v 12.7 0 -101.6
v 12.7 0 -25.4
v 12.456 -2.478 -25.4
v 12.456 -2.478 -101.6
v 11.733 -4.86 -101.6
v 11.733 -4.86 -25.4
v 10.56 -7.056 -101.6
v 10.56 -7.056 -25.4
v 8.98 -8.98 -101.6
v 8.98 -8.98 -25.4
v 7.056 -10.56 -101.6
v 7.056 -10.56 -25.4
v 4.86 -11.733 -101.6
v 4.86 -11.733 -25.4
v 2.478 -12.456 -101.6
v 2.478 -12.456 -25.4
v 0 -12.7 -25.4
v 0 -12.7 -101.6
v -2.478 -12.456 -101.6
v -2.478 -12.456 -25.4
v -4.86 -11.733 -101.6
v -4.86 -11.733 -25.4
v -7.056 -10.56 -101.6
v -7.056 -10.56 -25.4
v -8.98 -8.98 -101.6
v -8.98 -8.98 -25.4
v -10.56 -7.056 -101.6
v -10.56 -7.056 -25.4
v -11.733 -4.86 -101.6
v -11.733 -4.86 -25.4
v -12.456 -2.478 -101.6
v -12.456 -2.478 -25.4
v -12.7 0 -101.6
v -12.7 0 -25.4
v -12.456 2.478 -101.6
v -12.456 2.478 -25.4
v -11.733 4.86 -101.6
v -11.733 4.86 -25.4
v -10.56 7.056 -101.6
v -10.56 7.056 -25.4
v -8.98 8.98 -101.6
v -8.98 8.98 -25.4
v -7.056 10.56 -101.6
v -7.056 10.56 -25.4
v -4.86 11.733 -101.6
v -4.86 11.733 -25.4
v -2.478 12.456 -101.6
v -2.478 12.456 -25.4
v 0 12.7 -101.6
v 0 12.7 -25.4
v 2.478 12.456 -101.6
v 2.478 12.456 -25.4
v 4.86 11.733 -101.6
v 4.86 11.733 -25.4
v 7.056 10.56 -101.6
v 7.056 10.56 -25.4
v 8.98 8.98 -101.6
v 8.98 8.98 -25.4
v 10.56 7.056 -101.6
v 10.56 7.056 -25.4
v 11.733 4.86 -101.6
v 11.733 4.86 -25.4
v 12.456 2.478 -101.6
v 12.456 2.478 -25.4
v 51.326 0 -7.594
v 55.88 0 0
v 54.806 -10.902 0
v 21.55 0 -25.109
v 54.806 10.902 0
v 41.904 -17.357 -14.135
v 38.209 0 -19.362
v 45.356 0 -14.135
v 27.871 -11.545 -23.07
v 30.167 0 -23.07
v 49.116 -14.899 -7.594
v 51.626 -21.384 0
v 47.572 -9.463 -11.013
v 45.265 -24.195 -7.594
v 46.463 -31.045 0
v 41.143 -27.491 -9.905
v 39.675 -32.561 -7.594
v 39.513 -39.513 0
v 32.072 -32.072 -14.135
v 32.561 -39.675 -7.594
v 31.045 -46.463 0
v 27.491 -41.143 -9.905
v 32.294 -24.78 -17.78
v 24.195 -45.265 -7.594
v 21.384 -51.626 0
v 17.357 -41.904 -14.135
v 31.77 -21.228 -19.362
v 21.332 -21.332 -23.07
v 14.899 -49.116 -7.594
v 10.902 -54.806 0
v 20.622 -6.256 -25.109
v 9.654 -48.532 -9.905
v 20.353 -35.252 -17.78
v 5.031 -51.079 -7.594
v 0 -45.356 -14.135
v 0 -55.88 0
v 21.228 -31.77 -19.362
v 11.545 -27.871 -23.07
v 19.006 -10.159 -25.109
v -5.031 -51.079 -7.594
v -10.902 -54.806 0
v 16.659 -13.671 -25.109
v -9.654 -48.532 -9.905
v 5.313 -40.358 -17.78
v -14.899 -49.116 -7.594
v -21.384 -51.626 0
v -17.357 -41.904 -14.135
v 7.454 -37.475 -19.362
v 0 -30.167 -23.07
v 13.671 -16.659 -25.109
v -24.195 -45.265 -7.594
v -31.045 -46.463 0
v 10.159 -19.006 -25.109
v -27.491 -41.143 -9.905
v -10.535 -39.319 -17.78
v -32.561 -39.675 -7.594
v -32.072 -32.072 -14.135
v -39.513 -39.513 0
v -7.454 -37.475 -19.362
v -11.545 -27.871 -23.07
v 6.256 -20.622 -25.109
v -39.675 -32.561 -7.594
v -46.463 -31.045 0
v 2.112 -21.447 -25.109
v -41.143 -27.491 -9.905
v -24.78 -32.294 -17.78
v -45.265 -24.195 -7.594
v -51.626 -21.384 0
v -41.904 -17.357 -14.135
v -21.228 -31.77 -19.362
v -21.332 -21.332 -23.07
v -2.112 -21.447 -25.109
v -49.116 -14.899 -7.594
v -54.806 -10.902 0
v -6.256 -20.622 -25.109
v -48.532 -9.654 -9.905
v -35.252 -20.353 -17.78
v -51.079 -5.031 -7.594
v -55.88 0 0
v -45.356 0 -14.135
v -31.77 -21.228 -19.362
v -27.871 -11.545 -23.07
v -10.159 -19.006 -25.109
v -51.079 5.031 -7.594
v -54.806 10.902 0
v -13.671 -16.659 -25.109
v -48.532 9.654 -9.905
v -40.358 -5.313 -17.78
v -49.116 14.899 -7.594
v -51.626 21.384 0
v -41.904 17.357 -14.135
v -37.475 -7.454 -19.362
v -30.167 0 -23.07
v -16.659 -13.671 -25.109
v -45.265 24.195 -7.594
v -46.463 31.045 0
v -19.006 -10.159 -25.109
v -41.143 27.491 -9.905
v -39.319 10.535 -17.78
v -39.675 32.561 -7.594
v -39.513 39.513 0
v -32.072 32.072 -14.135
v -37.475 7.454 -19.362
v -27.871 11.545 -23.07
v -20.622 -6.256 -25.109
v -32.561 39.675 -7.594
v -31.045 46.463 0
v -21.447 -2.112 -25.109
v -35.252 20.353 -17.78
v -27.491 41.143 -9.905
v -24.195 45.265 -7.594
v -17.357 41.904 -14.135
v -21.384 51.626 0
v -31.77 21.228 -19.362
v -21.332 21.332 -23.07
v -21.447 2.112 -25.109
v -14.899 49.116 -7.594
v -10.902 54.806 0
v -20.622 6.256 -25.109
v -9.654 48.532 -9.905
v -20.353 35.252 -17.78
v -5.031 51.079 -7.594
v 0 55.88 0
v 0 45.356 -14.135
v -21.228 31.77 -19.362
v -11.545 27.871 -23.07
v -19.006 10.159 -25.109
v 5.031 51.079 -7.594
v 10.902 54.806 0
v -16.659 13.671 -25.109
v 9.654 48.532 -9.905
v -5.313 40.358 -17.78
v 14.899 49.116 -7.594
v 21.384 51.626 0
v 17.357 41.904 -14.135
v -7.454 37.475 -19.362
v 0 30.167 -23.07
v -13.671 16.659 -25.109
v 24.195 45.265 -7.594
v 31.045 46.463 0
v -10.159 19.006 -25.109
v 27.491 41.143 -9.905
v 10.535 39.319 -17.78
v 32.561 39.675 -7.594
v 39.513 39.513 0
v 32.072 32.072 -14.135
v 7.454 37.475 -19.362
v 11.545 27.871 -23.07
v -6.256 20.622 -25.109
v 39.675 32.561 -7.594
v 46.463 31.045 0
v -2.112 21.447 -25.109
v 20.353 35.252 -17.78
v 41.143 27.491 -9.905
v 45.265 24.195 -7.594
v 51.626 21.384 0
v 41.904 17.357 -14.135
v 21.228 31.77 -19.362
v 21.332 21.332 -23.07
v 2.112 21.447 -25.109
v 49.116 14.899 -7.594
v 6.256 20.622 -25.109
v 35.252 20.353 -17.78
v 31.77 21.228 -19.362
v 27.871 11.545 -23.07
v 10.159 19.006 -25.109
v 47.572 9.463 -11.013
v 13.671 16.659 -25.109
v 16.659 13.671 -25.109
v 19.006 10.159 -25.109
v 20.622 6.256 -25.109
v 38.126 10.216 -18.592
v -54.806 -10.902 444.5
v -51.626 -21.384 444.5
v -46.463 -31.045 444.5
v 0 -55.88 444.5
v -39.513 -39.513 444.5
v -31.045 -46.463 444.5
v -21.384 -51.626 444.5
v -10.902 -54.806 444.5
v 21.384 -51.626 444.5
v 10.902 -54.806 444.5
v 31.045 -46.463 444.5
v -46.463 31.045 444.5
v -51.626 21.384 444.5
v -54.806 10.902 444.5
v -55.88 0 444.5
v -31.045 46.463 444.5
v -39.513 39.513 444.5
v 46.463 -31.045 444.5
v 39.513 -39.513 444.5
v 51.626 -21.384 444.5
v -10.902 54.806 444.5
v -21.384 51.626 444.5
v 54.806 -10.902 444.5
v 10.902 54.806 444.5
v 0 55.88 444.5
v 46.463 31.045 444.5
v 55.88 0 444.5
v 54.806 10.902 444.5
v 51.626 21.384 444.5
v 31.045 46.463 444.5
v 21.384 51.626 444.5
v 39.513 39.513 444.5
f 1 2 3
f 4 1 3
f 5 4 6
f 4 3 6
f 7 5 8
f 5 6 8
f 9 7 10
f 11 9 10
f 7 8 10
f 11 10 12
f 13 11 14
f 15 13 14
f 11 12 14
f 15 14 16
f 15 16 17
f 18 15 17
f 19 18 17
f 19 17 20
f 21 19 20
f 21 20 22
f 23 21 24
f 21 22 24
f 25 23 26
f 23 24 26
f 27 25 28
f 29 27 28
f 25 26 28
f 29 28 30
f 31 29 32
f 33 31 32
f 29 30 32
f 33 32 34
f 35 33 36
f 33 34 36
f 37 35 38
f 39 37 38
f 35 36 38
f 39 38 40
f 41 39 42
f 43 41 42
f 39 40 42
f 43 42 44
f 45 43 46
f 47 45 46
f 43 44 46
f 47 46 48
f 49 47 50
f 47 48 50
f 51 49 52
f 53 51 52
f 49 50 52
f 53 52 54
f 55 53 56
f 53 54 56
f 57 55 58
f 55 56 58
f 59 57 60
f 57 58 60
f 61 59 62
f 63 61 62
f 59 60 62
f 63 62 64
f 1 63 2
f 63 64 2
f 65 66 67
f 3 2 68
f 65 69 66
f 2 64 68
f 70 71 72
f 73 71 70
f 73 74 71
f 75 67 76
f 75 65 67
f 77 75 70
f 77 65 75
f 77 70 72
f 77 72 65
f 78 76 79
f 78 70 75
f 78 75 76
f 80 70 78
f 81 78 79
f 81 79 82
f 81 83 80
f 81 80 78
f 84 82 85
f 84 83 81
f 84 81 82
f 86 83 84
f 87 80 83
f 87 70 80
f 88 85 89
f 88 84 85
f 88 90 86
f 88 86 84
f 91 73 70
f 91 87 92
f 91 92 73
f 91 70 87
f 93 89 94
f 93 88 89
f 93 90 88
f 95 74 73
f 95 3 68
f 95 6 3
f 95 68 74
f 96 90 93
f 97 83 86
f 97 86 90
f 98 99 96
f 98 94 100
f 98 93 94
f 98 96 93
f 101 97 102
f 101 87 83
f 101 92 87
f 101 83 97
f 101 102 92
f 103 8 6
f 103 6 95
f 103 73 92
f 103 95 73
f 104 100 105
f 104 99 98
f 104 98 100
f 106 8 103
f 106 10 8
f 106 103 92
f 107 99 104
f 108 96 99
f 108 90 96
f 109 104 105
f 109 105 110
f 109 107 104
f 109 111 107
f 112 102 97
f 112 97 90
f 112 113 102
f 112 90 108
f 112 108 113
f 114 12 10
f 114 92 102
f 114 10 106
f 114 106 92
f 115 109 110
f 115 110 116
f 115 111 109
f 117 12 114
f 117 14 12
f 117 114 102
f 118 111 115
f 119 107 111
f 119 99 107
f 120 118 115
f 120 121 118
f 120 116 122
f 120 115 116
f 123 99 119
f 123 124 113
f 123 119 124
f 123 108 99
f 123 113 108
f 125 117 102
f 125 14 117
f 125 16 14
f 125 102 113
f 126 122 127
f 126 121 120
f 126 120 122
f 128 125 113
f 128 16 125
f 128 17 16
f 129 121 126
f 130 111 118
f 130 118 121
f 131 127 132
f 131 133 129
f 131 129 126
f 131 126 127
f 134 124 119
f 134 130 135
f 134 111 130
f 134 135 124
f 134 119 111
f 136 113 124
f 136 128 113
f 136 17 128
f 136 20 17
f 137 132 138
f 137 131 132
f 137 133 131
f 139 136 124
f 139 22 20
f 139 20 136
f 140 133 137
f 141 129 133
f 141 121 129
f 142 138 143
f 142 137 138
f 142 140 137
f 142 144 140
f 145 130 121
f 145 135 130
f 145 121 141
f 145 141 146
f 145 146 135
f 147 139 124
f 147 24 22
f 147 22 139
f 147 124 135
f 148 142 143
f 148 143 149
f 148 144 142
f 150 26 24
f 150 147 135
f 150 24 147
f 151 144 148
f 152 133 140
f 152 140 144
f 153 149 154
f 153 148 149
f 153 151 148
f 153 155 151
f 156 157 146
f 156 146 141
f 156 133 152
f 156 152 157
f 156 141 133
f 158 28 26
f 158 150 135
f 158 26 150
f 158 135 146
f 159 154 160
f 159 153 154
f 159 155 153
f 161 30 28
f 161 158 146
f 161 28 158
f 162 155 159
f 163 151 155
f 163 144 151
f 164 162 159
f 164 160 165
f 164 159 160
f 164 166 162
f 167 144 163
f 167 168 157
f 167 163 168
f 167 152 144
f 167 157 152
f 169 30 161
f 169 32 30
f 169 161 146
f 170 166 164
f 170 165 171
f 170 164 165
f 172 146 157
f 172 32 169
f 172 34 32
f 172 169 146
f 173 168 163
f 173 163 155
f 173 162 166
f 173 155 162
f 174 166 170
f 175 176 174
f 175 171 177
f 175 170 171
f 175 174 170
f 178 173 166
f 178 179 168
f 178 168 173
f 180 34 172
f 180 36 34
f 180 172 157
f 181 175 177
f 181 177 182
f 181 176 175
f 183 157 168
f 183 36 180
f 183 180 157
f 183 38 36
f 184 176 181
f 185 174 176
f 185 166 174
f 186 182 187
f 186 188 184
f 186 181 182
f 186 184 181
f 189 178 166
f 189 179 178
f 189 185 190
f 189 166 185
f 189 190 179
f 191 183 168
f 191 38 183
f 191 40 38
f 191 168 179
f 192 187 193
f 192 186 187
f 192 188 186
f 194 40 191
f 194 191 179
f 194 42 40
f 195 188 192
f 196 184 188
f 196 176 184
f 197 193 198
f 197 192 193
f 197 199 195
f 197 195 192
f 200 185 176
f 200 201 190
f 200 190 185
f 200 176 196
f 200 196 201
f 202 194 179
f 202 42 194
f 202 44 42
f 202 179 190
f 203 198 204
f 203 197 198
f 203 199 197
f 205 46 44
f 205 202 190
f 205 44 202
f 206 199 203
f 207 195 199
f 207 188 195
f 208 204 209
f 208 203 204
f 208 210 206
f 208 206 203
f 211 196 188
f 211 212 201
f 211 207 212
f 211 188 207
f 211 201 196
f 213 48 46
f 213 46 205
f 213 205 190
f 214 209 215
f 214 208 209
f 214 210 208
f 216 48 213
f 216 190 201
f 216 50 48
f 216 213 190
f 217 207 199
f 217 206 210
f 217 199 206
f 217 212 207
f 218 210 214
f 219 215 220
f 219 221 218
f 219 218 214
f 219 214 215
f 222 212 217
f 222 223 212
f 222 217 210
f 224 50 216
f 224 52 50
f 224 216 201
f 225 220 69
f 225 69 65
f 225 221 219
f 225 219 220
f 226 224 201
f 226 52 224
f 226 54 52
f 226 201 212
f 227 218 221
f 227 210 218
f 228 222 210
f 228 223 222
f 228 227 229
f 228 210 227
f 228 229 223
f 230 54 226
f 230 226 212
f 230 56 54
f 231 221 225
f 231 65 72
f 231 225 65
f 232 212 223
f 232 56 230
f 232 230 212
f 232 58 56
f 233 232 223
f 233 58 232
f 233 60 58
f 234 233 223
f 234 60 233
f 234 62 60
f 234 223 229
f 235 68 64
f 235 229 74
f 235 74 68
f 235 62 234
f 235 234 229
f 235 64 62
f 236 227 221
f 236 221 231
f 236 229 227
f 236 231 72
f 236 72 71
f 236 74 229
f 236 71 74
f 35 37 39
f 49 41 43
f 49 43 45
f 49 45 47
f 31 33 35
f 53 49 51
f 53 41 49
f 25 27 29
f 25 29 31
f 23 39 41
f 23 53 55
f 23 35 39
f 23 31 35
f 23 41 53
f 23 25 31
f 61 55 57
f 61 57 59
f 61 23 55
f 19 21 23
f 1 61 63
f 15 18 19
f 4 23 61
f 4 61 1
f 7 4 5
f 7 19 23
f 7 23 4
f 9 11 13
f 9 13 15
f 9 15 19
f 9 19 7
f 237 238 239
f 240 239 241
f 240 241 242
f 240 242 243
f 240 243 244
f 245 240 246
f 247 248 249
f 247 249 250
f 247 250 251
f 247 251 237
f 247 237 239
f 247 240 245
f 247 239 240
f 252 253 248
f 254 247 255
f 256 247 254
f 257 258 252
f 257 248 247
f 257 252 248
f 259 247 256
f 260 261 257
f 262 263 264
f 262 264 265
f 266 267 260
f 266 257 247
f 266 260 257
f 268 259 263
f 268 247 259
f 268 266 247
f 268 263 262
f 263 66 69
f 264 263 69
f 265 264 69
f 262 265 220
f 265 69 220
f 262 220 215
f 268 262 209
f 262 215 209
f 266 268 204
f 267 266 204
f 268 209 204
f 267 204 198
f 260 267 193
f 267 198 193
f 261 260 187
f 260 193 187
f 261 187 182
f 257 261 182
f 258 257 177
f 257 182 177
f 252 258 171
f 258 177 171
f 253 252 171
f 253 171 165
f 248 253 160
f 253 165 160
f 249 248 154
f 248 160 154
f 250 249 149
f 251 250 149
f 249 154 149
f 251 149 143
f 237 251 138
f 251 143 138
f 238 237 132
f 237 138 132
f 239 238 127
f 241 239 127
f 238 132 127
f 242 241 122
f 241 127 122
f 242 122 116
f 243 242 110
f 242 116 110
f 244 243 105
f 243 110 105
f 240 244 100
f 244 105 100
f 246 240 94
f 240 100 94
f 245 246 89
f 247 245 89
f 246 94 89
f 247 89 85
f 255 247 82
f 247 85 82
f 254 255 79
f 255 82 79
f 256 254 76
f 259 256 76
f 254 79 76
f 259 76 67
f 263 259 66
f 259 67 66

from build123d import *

# Parameters (mm, degrees)
SKETCH1_R           = 55.88
BOSS_EXTRUDE1_DEPTH = 444.5
SKETCH4_R           = 12.7
BOSS_EXTRUDE3_DEPTH = 76.2


with BuildPart() as part:
    # Sketch1 → Boss-Extrude1 (new body)
    with BuildSketch(Plane.XY):
        Circle(SKETCH1_R)
    extrude(amount=BOSS_EXTRUDE1_DEPTH)

    # Sketch3 → Revolve1 (revolve)
    with BuildSketch(Plane(origin=(0, 0, 0), x_dir=(0, 0, -1), z_dir=(1, 0, 0)), mode=Mode.PRIVATE) as revolve1_sk:
        with BuildLine():
            Line((25.4, -12.7), (25.4, 0))
            Line((25.4, 0), (0, 0))
            Line((0, 0), (0, -55.88))
            ThreePointArc((0, -55.88), (19.362446334, -38.209086079), (25.4, -12.7))
        make_face()
    revolve(revolve1_sk.sketch.rotate(Axis((0, 0, 0), (0, 0, -1)), 270), axis=Axis((0, 0, 0), (0, 0, -1)))

    # Sketch4 → Boss-Extrude3 (add)
    with BuildSketch(Plane(origin=(0, 0, -25.4), x_dir=(-1, 0, 0), z_dir=(0, 0, -1))):
        with Locations(Location((0, 0, 0), (0, 0, 180))):
            Circle(SKETCH4_R)
    extrude(amount=BOSS_EXTRUDE3_DEPTH)


solid = part.part
